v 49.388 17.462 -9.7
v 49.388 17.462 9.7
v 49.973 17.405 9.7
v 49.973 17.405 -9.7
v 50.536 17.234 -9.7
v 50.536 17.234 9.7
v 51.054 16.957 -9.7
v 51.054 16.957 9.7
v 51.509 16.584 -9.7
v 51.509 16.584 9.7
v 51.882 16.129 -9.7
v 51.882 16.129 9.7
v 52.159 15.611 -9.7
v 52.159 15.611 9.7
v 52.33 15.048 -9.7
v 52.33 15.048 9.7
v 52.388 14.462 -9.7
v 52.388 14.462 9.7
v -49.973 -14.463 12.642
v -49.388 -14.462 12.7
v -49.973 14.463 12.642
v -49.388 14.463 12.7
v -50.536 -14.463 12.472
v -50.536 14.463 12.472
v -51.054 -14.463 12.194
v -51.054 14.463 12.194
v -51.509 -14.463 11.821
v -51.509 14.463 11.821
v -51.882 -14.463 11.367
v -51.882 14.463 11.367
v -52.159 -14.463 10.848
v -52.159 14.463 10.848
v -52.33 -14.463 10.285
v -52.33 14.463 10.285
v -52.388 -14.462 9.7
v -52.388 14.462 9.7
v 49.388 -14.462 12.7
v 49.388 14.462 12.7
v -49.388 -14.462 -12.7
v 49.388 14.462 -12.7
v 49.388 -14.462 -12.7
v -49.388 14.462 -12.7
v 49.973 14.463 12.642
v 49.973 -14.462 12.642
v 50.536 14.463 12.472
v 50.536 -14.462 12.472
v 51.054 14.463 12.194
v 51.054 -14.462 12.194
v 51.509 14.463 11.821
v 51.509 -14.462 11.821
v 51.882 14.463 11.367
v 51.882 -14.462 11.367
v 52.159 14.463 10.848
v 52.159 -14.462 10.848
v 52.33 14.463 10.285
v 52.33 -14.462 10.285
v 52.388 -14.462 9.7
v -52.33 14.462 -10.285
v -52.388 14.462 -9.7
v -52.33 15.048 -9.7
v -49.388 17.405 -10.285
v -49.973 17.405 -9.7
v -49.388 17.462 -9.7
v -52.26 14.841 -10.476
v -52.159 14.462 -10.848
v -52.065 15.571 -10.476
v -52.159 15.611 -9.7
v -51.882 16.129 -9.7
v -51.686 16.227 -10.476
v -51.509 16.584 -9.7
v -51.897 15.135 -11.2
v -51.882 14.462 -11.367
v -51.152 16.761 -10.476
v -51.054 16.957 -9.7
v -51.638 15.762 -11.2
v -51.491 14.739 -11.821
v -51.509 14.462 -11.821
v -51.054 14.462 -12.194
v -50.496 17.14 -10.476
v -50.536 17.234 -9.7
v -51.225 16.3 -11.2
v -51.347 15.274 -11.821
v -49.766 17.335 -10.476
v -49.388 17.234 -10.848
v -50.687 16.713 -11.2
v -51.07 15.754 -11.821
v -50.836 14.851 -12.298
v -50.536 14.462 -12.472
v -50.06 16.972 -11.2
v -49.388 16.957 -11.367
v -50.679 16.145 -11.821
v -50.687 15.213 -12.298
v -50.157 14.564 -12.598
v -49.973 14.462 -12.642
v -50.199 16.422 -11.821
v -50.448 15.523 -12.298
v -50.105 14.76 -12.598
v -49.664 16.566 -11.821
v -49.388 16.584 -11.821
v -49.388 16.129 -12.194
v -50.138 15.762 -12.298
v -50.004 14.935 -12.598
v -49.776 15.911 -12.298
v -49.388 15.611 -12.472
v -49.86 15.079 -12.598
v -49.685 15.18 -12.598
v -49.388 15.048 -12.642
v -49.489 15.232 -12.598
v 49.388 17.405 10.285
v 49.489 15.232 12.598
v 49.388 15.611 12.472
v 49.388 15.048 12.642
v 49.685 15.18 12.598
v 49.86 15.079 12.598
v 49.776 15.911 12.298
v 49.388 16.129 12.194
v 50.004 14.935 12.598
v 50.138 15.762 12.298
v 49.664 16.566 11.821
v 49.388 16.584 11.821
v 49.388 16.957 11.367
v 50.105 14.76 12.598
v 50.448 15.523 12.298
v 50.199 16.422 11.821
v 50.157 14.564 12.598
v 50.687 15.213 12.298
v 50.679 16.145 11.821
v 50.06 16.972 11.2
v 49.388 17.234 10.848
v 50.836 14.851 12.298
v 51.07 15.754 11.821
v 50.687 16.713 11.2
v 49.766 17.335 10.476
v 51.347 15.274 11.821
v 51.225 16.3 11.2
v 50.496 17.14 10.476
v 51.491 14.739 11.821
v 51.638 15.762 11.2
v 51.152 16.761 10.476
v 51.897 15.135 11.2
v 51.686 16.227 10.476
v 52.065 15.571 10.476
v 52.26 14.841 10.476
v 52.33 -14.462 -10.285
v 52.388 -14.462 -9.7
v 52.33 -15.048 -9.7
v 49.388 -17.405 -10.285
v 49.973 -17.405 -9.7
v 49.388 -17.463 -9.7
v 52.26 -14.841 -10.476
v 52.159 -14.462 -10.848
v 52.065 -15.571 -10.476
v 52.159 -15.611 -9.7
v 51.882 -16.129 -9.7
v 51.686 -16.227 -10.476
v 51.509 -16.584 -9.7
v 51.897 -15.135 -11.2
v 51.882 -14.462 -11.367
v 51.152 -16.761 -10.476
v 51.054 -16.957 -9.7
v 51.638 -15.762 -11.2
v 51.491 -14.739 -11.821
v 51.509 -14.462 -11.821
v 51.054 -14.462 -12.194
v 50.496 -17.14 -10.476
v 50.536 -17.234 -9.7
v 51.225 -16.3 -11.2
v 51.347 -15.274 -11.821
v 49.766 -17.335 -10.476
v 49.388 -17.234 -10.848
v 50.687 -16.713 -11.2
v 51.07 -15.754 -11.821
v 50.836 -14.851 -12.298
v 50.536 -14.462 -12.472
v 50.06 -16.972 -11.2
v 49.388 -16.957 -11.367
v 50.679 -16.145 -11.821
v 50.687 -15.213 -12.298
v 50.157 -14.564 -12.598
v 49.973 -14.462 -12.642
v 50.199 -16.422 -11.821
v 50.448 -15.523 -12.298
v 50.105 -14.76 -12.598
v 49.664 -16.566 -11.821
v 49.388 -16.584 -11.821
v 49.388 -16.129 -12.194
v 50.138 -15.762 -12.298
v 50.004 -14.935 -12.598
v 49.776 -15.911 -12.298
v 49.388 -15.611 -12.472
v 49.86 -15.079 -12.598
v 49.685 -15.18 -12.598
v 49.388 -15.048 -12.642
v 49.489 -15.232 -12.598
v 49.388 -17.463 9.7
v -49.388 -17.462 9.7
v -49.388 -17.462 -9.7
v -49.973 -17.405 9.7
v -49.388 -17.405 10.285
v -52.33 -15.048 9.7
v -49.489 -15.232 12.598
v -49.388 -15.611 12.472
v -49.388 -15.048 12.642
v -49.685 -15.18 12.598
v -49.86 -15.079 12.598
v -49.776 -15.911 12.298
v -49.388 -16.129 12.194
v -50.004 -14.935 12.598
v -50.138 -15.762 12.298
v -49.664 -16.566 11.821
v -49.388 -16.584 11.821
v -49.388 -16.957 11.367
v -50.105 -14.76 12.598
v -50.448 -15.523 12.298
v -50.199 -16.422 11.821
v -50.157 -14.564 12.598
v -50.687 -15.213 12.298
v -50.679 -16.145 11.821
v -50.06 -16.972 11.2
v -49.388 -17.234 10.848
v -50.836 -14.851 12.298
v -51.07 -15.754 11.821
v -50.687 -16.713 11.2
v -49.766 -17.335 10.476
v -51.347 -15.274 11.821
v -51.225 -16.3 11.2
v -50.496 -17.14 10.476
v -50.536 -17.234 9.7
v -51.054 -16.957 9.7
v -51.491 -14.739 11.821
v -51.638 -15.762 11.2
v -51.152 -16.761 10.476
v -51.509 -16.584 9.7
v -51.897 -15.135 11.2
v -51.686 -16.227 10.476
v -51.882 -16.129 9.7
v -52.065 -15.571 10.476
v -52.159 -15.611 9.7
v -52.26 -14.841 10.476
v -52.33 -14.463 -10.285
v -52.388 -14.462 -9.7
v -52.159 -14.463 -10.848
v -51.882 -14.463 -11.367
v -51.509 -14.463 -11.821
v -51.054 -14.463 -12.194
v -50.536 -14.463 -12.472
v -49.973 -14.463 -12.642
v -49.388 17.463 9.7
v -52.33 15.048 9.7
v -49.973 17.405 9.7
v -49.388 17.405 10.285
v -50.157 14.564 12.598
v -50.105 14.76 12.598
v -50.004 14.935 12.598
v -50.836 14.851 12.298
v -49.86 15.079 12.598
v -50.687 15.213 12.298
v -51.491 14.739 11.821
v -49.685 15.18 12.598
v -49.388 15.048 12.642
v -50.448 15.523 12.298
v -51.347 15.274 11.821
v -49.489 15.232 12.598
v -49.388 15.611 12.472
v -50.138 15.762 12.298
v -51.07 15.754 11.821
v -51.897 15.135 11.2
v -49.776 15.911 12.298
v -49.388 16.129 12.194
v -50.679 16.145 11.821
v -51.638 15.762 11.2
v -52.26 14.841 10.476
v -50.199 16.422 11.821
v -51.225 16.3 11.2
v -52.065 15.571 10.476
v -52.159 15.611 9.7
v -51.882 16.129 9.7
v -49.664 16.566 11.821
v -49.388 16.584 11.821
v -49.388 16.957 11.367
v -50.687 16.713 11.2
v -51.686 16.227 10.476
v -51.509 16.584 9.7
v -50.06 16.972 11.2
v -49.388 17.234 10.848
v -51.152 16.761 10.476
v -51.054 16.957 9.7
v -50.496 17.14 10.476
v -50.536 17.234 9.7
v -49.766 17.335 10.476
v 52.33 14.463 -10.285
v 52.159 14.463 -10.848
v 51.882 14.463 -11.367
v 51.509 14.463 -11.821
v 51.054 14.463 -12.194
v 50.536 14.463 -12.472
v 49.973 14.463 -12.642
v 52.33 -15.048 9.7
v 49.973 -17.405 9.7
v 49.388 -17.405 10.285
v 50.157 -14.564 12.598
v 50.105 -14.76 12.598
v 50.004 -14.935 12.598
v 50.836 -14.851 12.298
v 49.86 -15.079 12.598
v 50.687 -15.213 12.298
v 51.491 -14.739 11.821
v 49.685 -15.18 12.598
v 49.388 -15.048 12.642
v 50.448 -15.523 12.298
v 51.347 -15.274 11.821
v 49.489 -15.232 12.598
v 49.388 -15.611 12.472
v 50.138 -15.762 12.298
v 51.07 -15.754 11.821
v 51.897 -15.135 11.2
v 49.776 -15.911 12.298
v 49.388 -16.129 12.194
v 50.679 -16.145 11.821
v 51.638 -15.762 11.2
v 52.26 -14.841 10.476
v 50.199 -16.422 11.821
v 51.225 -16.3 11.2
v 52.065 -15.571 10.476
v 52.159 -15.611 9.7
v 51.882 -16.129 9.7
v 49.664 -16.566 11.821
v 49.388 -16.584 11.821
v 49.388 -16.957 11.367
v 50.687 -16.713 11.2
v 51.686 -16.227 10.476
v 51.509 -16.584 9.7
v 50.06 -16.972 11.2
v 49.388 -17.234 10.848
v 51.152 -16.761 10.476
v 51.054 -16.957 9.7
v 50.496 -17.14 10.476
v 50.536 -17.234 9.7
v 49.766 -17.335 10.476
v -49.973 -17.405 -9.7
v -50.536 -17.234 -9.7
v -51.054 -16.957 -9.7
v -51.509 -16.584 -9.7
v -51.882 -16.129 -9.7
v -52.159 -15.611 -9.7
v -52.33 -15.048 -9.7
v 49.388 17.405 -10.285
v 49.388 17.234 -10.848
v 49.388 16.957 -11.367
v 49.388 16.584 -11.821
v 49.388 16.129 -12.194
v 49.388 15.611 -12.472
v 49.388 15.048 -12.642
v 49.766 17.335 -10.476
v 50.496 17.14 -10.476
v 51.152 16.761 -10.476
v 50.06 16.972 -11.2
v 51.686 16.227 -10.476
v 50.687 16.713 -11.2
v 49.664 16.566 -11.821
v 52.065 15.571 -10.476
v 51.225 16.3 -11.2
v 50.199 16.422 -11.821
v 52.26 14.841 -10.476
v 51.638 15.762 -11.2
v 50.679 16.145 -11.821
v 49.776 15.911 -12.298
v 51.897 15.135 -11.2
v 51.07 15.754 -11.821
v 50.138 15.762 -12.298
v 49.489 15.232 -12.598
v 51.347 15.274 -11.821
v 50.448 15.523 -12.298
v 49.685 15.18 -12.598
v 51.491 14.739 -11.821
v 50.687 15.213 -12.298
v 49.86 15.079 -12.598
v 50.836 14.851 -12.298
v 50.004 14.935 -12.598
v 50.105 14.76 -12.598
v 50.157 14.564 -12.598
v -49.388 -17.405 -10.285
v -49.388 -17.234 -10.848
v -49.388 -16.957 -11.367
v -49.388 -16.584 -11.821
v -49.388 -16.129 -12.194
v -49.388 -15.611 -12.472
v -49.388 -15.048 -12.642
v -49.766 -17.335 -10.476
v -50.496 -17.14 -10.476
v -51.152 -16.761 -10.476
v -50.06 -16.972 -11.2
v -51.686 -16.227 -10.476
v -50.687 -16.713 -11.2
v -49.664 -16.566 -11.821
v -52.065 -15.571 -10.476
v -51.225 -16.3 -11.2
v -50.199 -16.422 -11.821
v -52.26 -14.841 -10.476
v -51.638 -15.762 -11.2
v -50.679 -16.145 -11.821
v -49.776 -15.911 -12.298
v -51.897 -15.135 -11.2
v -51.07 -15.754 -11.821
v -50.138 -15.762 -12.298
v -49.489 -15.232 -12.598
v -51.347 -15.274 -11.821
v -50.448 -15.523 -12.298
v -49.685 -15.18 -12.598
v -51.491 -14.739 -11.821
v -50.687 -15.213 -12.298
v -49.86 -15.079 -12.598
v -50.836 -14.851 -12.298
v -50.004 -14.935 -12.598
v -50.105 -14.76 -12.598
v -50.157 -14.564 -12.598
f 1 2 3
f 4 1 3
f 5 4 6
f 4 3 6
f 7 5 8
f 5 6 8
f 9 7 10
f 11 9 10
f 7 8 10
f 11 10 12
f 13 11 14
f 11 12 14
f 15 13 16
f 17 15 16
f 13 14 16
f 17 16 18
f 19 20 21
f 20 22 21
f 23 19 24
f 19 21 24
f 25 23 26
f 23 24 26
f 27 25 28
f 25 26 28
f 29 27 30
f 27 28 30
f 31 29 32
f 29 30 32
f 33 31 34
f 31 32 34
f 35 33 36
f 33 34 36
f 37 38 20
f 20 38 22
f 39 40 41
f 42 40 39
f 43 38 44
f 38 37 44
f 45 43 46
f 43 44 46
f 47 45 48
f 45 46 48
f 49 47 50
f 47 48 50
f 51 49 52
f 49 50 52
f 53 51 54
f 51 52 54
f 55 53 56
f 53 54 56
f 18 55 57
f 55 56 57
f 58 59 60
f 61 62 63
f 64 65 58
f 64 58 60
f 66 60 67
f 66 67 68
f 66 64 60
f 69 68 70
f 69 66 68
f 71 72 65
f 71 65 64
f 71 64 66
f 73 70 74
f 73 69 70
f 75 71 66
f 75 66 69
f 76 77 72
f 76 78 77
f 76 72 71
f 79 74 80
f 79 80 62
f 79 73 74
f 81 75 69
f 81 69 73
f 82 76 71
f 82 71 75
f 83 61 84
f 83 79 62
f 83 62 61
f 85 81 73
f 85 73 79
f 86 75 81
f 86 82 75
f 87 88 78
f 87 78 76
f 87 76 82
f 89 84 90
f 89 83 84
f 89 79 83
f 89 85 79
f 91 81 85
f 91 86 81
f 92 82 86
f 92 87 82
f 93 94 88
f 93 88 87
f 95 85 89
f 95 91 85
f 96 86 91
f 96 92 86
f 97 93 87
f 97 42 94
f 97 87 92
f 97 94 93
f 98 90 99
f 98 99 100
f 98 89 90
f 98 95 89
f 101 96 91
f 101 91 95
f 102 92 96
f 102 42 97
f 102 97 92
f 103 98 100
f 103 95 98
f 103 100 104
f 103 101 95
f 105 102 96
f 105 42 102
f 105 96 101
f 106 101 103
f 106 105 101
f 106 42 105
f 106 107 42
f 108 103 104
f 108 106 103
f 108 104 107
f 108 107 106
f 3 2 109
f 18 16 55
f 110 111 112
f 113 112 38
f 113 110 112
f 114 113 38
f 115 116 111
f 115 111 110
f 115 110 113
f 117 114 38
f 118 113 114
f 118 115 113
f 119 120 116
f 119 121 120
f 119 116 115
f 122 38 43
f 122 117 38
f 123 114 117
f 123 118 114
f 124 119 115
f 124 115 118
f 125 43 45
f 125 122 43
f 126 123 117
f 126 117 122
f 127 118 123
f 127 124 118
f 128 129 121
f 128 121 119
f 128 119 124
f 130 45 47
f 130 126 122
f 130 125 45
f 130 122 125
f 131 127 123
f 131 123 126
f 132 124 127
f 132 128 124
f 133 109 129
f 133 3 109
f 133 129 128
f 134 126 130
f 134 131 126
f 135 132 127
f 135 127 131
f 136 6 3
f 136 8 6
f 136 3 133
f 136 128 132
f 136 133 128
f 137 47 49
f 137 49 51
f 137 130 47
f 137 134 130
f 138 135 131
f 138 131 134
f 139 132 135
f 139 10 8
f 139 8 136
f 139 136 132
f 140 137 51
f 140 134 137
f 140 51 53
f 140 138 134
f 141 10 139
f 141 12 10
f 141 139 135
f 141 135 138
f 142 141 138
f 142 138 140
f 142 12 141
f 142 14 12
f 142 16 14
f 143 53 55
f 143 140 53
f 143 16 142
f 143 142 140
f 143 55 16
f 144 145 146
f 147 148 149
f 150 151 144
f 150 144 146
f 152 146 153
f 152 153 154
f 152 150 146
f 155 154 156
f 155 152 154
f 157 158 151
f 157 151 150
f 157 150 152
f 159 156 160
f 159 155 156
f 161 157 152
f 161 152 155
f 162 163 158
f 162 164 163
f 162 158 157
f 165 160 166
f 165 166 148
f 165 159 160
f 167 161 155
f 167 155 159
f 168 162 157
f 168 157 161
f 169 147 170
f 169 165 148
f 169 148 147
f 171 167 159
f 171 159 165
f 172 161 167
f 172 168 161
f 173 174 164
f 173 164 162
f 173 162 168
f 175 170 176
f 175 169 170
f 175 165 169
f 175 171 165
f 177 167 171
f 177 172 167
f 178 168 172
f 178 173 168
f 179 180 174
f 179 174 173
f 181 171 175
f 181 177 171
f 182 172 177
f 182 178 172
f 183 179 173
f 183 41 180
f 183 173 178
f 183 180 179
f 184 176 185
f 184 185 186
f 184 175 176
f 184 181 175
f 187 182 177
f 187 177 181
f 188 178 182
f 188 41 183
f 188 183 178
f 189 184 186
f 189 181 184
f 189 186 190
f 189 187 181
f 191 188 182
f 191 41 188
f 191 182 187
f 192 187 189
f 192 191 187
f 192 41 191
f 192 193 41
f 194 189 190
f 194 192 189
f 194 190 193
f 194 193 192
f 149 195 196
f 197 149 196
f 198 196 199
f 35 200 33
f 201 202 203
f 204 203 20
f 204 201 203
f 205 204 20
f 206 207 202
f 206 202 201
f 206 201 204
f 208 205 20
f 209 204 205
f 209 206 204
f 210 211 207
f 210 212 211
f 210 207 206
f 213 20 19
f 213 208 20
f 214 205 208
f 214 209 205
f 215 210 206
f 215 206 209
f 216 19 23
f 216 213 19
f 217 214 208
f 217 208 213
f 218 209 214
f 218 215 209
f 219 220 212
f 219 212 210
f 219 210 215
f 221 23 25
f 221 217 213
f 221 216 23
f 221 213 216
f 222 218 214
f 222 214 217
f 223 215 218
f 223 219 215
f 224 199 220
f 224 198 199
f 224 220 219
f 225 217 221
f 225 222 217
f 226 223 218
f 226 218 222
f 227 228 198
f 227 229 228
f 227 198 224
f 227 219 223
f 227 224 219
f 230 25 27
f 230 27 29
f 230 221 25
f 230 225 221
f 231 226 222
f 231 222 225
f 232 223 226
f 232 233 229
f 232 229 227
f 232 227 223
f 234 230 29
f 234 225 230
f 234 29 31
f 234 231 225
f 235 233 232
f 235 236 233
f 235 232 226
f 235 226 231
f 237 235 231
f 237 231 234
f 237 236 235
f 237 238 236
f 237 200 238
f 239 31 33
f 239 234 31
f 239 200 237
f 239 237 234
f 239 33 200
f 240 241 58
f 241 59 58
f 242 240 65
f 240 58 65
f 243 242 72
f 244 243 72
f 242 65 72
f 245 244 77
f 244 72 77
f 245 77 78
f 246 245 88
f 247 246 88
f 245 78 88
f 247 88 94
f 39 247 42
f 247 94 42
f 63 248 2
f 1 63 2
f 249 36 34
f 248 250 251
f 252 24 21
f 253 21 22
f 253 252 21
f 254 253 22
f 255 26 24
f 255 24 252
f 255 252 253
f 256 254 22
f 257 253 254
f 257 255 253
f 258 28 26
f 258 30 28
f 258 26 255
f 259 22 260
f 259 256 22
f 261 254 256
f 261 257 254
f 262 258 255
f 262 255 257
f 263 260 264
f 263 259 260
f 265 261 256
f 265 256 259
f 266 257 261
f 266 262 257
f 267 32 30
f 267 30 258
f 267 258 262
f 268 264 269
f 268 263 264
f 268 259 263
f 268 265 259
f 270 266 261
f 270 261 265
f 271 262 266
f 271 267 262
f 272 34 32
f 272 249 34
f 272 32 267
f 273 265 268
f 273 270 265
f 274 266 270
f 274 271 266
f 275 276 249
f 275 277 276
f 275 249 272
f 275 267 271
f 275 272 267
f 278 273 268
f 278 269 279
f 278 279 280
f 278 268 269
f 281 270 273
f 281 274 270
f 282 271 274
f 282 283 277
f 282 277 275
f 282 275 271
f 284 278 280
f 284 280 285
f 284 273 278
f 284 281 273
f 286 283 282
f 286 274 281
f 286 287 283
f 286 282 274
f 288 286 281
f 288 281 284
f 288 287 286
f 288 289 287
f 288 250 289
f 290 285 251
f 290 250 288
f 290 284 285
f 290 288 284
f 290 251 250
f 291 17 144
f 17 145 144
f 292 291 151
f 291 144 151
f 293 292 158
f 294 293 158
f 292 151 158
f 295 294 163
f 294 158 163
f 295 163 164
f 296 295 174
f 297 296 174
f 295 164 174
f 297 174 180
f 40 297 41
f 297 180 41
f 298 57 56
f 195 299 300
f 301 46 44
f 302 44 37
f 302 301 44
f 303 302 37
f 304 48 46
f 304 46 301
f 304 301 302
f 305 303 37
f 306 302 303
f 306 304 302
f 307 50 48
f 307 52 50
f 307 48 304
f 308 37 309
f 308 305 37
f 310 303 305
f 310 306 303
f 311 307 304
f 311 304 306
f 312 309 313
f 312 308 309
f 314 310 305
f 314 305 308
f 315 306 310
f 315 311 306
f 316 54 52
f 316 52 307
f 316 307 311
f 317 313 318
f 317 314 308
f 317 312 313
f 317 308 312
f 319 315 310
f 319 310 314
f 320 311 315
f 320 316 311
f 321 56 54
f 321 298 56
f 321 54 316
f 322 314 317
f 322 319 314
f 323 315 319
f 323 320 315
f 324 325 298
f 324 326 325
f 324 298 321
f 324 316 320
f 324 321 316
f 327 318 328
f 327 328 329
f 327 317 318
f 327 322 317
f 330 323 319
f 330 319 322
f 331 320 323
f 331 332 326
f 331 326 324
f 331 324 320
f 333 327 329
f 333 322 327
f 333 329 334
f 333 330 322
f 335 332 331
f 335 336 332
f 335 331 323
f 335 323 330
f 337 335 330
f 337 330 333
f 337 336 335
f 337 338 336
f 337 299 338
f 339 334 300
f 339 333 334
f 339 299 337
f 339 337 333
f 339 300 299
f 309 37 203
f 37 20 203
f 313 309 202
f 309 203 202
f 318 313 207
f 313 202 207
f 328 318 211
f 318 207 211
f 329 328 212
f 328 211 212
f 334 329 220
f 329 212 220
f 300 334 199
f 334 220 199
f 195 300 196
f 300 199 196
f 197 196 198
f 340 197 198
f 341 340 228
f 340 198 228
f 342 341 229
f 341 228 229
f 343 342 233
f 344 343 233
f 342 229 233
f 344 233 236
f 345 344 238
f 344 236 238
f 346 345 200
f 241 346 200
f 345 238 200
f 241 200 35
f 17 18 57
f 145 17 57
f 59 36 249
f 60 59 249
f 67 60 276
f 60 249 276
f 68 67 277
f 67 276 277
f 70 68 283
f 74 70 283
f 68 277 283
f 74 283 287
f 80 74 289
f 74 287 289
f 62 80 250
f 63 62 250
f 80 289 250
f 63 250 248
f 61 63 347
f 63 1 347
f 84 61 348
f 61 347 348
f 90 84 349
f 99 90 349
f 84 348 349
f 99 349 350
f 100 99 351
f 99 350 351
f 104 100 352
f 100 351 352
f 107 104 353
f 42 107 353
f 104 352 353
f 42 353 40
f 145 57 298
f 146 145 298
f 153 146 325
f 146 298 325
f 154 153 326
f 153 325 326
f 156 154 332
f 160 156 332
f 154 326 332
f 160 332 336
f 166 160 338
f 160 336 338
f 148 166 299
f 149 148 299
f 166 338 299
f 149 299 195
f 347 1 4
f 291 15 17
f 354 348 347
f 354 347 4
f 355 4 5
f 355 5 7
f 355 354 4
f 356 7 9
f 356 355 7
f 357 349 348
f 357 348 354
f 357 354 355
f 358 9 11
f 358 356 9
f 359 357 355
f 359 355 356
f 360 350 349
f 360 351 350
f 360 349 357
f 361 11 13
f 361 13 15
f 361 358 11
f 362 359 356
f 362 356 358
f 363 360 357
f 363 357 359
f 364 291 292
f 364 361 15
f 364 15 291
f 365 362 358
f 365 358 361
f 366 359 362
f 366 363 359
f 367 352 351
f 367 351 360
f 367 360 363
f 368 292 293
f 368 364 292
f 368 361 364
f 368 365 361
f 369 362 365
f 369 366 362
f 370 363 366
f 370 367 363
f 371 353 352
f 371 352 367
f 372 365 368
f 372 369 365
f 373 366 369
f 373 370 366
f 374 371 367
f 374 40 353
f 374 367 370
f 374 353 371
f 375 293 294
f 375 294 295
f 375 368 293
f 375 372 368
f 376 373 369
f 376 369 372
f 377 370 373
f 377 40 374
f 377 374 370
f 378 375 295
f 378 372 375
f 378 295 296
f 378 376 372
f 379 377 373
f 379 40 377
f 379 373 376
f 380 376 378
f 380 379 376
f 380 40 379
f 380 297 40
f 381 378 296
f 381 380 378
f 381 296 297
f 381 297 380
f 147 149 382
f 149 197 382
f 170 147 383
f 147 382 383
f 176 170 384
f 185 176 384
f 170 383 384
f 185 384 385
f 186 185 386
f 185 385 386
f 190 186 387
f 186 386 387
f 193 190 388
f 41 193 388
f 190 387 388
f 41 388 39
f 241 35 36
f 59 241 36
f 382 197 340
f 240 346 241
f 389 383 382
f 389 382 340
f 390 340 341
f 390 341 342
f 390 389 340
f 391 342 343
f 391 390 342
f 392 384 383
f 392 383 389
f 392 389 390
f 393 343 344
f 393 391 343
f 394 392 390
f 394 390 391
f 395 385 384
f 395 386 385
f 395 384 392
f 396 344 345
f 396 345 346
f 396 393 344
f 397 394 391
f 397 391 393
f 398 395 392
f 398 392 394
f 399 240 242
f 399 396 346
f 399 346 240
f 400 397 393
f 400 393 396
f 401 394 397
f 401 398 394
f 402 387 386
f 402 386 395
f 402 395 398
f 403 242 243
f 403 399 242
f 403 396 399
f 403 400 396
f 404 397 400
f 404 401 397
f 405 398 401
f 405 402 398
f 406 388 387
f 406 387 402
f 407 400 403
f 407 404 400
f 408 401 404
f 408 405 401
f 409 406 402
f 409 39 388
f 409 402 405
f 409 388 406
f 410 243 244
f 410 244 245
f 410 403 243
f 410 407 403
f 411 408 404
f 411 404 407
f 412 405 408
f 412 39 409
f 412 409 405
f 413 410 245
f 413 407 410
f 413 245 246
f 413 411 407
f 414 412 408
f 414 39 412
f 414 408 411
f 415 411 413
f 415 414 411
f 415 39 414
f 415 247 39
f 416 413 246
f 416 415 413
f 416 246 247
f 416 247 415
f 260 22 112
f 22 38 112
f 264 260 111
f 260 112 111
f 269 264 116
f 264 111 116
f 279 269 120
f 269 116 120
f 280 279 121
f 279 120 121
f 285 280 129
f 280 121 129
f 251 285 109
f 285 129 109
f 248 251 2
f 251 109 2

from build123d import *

# Parameters (mm, degrees)
SALIENTE_EXTRUIR1_DEPTH = 12.7
REDONDEO1_R             = 3
REDONDEO2_R             = 3


with BuildPart() as part:
    # Croquis1 → Saliente-Extruir1 (new, symmetric)
    with BuildSketch(Plane.XY):
        with BuildLine():
            Line((-49.3875, 17.4625), (49.3875, 17.4625))
            ThreePointArc((49.3875, 17.4625), (51.508820344, 16.583820344), (52.3875, 14.4625))
            Line((52.3875, 14.4625), (52.3875, -14.4625))
            ThreePointArc((52.3875, -14.4625), (51.508820344, -16.583820344), (49.3875, -17.4625))
            Line((49.3875, -17.4625), (-49.3875, -17.4625))
            ThreePointArc((-49.3875, -17.4625), (-51.508820344, -16.583820344), (-52.3875, -14.4625))
            Line((-52.3875, -14.4625), (-52.3875, 14.4625))
            ThreePointArc((-52.3875, 14.4625), (-51.508820344, 16.583820344), (-49.3875, 17.4625))
        make_face()
    extrude(amount=SALIENTE_EXTRUIR1_DEPTH, both=True)

    # Redondeo1
    redondeo1_edges = [part.edges().sort_by_distance(p)[0] for p in [
        (-51.508820344, 16.583820344, 12.7),
        (-52.3875, 0, 12.7),
        (-51.508820344, -16.583820344, 12.7),
        (0, -17.4625, 12.7),
        (51.508820344, -16.583820344, 12.7),
        (52.3875, 0, 12.7),
        (51.508820344, 16.583820344, 12.7),
        (0, 17.4625, 12.7),
    ]]
    fillet(redondeo1_edges, radius=REDONDEO1_R)

    # Redondeo2
    redondeo2_edges = [part.edges().sort_by_distance(p)[0] for p in [
        (0, 17.4625, -12.7),
        (51.508820344, 16.583820344, -12.7),
        (52.3875, 0, -12.7),
        (51.508820344, -16.583820344, -12.7),
        (0, -17.4625, -12.7),
        (-51.508820344, -16.583820344, -12.7),
        (-52.3875, 0, -12.7),
        (-51.508820344, 16.583820344, -12.7),
    ]]
    fillet(redondeo2_edges, radius=REDONDEO2_R)


solid = part.part
